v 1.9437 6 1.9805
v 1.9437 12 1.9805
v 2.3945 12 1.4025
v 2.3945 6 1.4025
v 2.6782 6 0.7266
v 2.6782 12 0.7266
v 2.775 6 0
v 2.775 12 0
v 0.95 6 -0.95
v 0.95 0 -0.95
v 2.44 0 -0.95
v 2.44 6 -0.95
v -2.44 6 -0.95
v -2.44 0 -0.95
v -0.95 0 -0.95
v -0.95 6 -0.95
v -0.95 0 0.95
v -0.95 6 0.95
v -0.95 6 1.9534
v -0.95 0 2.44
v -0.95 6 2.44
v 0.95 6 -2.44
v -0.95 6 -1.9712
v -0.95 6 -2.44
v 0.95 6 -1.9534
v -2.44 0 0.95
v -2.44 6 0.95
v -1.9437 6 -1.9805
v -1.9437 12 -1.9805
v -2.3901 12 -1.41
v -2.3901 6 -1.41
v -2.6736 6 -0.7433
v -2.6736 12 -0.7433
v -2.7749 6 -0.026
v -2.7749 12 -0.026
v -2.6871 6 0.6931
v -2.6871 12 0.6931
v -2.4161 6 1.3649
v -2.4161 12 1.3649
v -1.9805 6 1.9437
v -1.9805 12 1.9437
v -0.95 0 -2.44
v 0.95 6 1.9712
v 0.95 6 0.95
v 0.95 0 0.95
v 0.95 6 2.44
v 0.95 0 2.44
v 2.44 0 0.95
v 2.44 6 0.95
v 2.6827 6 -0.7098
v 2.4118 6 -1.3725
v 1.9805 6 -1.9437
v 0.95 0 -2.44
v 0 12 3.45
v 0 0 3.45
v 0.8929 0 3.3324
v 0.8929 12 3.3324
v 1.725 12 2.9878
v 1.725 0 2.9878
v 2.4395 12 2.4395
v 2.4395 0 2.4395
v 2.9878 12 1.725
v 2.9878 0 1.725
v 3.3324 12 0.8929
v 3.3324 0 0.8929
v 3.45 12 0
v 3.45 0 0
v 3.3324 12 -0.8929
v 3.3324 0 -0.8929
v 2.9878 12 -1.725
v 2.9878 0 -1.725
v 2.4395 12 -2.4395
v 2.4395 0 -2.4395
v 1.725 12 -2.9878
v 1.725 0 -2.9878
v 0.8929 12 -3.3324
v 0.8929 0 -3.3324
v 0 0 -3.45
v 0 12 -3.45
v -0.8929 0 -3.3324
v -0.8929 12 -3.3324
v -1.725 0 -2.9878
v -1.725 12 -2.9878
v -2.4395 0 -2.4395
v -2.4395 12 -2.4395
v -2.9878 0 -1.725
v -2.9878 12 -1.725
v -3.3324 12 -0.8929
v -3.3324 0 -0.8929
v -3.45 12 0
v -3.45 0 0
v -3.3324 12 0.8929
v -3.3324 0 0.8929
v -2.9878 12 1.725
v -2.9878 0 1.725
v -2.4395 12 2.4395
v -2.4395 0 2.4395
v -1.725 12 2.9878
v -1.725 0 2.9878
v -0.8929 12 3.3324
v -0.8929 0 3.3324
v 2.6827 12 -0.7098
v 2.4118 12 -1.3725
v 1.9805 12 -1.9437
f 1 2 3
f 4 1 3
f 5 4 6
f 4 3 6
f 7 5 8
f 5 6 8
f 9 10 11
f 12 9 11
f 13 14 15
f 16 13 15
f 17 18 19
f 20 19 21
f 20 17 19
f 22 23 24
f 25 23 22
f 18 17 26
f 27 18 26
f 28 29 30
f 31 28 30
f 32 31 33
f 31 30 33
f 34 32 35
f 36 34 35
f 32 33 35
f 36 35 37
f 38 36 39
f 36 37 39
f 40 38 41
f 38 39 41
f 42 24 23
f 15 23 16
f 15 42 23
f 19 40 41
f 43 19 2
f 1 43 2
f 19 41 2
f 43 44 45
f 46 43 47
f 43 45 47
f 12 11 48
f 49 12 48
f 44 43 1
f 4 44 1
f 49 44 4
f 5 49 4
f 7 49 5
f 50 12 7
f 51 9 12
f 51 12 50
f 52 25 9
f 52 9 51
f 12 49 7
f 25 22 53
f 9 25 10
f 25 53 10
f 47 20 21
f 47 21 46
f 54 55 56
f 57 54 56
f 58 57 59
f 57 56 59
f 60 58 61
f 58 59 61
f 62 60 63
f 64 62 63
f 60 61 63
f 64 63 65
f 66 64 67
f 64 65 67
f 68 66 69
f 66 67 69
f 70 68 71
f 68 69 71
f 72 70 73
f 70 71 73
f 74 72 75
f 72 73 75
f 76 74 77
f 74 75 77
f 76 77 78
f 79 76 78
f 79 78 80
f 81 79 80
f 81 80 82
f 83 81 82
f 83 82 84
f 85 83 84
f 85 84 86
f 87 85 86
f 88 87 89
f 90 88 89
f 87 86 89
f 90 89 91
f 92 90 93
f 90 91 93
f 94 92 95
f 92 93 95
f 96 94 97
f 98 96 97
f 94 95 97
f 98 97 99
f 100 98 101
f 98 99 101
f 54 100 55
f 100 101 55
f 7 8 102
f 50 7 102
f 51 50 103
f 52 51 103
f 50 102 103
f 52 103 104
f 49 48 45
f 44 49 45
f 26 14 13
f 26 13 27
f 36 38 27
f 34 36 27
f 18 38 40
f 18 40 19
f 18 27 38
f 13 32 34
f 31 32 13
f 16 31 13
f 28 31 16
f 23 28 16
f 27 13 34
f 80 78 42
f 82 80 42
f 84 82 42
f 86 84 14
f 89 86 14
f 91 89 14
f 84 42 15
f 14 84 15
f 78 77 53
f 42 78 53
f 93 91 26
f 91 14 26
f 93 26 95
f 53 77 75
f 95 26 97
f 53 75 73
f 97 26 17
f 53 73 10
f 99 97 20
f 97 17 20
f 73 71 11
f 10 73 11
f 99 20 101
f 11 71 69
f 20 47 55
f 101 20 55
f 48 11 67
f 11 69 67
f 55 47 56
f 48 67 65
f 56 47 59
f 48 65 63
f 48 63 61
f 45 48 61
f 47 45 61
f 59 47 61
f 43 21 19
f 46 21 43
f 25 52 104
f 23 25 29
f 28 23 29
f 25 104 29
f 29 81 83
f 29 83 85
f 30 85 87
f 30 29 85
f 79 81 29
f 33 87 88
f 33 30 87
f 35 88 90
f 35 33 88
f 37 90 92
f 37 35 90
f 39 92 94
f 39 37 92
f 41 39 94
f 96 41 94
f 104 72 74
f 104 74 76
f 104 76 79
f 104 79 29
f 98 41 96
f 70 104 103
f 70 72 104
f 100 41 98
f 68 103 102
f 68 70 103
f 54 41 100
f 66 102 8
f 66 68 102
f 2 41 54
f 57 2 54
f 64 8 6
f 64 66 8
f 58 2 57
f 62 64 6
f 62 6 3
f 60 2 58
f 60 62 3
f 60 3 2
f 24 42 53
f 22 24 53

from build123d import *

# Parameters (mm, degrees)
SKETCH1_R           = 3.45
BOSS_EXTRUDE1_DEPTH = 12
CUT_EXTRUDE1_DEPTH  = 6
SKETCH3_3_W         = 1.9
SKETCH3_3_H         = 1.9
SKETCH3_3_W_2       = 1.49
SKETCH3_3_H_2       = 1.49
CUT_EXTRUDE3_DEPTH  = 6
SKETCH3_W           = 1.9
SKETCH3_H           = 1.9
SKETCH3_W_2         = 1.49
SKETCH3_H_2         = 1.49
CUT_EXTRUDE2_DEPTH  = 6


with BuildPart() as part:
    # Sketch1 → Boss-Extrude1 (new body)
    with BuildSketch(Plane(origin=(0, 0, 0), x_dir=(1, 0, 0), z_dir=(0, 1, 0))):
        with Locations(Location((0, 0, 0), (0, 0, 270))):
            Circle(SKETCH1_R)
    extrude(amount=BOSS_EXTRUDE1_DEPTH)

    # Sketch2 → Cut-Extrude1 (cut)
    with BuildSketch(Plane(origin=(0, 12, 0), x_dir=(1, 0, 0), z_dir=(0, 1, 0))):
        with BuildLine():
            Line((-1.980523516, -1.943746794), (1.943746794, -1.980523516))
            ThreePointArc((1.943746794, -1.980523516), (2.558761649, -1.073947775), (2.775, 0))
            ThreePointArc((2.775, 0), (2.568713468, 1.049921959), (1.980523516, 1.943746794))
            Line((1.980523516, 1.943746794), (-1.943746794, 1.980523516))
            ThreePointArc((-1.943746794, 1.980523516), (-2.774878148, 0.026005069), (-1.980523516, -1.943746794))
        make_face()
    extrude(amount=-CUT_EXTRUDE1_DEPTH, mode=Mode.SUBTRACT)

    # Sketch3<3> → Cut-Extrude3 (cut)
    with BuildSketch(Plane.XZ):
        Rectangle(SKETCH3_3_W, SKETCH3_3_H)
        with Locations((-1.695, 0)):
            Rectangle(SKETCH3_3_W_2, SKETCH3_3_H)
        with Locations((1.695, 0)):
            Rectangle(SKETCH3_3_W_2, SKETCH3_3_H)
        with Locations((0, -1.695)):
            Rectangle(SKETCH3_3_W, SKETCH3_3_H_2)
        with Locations((0, 1.695)):
            Rectangle(SKETCH3_3_W, SKETCH3_3_H_2)
    extrude(amount=-CUT_EXTRUDE3_DEPTH, mode=Mode.SUBTRACT)

    # Sketch3 → Cut-Extrude2 (cut)
    with BuildSketch(Plane.XZ):
        Rectangle(SKETCH3_W, SKETCH3_H)
        with Locations((-1.695, 0)):
            Rectangle(SKETCH3_W_2, SKETCH3_H)
        with Locations((0, -1.695)):
            Rectangle(SKETCH3_W, SKETCH3_H_2)
        with Locations((1.695, 0)):
            Rectangle(SKETCH3_W_2, SKETCH3_H)
        with Locations((0, 1.695)):
            Rectangle(SKETCH3_W, SKETCH3_H_2)
    extrude(amount=-CUT_EXTRUDE2_DEPTH, mode=Mode.SUBTRACT)


solid = part.part
